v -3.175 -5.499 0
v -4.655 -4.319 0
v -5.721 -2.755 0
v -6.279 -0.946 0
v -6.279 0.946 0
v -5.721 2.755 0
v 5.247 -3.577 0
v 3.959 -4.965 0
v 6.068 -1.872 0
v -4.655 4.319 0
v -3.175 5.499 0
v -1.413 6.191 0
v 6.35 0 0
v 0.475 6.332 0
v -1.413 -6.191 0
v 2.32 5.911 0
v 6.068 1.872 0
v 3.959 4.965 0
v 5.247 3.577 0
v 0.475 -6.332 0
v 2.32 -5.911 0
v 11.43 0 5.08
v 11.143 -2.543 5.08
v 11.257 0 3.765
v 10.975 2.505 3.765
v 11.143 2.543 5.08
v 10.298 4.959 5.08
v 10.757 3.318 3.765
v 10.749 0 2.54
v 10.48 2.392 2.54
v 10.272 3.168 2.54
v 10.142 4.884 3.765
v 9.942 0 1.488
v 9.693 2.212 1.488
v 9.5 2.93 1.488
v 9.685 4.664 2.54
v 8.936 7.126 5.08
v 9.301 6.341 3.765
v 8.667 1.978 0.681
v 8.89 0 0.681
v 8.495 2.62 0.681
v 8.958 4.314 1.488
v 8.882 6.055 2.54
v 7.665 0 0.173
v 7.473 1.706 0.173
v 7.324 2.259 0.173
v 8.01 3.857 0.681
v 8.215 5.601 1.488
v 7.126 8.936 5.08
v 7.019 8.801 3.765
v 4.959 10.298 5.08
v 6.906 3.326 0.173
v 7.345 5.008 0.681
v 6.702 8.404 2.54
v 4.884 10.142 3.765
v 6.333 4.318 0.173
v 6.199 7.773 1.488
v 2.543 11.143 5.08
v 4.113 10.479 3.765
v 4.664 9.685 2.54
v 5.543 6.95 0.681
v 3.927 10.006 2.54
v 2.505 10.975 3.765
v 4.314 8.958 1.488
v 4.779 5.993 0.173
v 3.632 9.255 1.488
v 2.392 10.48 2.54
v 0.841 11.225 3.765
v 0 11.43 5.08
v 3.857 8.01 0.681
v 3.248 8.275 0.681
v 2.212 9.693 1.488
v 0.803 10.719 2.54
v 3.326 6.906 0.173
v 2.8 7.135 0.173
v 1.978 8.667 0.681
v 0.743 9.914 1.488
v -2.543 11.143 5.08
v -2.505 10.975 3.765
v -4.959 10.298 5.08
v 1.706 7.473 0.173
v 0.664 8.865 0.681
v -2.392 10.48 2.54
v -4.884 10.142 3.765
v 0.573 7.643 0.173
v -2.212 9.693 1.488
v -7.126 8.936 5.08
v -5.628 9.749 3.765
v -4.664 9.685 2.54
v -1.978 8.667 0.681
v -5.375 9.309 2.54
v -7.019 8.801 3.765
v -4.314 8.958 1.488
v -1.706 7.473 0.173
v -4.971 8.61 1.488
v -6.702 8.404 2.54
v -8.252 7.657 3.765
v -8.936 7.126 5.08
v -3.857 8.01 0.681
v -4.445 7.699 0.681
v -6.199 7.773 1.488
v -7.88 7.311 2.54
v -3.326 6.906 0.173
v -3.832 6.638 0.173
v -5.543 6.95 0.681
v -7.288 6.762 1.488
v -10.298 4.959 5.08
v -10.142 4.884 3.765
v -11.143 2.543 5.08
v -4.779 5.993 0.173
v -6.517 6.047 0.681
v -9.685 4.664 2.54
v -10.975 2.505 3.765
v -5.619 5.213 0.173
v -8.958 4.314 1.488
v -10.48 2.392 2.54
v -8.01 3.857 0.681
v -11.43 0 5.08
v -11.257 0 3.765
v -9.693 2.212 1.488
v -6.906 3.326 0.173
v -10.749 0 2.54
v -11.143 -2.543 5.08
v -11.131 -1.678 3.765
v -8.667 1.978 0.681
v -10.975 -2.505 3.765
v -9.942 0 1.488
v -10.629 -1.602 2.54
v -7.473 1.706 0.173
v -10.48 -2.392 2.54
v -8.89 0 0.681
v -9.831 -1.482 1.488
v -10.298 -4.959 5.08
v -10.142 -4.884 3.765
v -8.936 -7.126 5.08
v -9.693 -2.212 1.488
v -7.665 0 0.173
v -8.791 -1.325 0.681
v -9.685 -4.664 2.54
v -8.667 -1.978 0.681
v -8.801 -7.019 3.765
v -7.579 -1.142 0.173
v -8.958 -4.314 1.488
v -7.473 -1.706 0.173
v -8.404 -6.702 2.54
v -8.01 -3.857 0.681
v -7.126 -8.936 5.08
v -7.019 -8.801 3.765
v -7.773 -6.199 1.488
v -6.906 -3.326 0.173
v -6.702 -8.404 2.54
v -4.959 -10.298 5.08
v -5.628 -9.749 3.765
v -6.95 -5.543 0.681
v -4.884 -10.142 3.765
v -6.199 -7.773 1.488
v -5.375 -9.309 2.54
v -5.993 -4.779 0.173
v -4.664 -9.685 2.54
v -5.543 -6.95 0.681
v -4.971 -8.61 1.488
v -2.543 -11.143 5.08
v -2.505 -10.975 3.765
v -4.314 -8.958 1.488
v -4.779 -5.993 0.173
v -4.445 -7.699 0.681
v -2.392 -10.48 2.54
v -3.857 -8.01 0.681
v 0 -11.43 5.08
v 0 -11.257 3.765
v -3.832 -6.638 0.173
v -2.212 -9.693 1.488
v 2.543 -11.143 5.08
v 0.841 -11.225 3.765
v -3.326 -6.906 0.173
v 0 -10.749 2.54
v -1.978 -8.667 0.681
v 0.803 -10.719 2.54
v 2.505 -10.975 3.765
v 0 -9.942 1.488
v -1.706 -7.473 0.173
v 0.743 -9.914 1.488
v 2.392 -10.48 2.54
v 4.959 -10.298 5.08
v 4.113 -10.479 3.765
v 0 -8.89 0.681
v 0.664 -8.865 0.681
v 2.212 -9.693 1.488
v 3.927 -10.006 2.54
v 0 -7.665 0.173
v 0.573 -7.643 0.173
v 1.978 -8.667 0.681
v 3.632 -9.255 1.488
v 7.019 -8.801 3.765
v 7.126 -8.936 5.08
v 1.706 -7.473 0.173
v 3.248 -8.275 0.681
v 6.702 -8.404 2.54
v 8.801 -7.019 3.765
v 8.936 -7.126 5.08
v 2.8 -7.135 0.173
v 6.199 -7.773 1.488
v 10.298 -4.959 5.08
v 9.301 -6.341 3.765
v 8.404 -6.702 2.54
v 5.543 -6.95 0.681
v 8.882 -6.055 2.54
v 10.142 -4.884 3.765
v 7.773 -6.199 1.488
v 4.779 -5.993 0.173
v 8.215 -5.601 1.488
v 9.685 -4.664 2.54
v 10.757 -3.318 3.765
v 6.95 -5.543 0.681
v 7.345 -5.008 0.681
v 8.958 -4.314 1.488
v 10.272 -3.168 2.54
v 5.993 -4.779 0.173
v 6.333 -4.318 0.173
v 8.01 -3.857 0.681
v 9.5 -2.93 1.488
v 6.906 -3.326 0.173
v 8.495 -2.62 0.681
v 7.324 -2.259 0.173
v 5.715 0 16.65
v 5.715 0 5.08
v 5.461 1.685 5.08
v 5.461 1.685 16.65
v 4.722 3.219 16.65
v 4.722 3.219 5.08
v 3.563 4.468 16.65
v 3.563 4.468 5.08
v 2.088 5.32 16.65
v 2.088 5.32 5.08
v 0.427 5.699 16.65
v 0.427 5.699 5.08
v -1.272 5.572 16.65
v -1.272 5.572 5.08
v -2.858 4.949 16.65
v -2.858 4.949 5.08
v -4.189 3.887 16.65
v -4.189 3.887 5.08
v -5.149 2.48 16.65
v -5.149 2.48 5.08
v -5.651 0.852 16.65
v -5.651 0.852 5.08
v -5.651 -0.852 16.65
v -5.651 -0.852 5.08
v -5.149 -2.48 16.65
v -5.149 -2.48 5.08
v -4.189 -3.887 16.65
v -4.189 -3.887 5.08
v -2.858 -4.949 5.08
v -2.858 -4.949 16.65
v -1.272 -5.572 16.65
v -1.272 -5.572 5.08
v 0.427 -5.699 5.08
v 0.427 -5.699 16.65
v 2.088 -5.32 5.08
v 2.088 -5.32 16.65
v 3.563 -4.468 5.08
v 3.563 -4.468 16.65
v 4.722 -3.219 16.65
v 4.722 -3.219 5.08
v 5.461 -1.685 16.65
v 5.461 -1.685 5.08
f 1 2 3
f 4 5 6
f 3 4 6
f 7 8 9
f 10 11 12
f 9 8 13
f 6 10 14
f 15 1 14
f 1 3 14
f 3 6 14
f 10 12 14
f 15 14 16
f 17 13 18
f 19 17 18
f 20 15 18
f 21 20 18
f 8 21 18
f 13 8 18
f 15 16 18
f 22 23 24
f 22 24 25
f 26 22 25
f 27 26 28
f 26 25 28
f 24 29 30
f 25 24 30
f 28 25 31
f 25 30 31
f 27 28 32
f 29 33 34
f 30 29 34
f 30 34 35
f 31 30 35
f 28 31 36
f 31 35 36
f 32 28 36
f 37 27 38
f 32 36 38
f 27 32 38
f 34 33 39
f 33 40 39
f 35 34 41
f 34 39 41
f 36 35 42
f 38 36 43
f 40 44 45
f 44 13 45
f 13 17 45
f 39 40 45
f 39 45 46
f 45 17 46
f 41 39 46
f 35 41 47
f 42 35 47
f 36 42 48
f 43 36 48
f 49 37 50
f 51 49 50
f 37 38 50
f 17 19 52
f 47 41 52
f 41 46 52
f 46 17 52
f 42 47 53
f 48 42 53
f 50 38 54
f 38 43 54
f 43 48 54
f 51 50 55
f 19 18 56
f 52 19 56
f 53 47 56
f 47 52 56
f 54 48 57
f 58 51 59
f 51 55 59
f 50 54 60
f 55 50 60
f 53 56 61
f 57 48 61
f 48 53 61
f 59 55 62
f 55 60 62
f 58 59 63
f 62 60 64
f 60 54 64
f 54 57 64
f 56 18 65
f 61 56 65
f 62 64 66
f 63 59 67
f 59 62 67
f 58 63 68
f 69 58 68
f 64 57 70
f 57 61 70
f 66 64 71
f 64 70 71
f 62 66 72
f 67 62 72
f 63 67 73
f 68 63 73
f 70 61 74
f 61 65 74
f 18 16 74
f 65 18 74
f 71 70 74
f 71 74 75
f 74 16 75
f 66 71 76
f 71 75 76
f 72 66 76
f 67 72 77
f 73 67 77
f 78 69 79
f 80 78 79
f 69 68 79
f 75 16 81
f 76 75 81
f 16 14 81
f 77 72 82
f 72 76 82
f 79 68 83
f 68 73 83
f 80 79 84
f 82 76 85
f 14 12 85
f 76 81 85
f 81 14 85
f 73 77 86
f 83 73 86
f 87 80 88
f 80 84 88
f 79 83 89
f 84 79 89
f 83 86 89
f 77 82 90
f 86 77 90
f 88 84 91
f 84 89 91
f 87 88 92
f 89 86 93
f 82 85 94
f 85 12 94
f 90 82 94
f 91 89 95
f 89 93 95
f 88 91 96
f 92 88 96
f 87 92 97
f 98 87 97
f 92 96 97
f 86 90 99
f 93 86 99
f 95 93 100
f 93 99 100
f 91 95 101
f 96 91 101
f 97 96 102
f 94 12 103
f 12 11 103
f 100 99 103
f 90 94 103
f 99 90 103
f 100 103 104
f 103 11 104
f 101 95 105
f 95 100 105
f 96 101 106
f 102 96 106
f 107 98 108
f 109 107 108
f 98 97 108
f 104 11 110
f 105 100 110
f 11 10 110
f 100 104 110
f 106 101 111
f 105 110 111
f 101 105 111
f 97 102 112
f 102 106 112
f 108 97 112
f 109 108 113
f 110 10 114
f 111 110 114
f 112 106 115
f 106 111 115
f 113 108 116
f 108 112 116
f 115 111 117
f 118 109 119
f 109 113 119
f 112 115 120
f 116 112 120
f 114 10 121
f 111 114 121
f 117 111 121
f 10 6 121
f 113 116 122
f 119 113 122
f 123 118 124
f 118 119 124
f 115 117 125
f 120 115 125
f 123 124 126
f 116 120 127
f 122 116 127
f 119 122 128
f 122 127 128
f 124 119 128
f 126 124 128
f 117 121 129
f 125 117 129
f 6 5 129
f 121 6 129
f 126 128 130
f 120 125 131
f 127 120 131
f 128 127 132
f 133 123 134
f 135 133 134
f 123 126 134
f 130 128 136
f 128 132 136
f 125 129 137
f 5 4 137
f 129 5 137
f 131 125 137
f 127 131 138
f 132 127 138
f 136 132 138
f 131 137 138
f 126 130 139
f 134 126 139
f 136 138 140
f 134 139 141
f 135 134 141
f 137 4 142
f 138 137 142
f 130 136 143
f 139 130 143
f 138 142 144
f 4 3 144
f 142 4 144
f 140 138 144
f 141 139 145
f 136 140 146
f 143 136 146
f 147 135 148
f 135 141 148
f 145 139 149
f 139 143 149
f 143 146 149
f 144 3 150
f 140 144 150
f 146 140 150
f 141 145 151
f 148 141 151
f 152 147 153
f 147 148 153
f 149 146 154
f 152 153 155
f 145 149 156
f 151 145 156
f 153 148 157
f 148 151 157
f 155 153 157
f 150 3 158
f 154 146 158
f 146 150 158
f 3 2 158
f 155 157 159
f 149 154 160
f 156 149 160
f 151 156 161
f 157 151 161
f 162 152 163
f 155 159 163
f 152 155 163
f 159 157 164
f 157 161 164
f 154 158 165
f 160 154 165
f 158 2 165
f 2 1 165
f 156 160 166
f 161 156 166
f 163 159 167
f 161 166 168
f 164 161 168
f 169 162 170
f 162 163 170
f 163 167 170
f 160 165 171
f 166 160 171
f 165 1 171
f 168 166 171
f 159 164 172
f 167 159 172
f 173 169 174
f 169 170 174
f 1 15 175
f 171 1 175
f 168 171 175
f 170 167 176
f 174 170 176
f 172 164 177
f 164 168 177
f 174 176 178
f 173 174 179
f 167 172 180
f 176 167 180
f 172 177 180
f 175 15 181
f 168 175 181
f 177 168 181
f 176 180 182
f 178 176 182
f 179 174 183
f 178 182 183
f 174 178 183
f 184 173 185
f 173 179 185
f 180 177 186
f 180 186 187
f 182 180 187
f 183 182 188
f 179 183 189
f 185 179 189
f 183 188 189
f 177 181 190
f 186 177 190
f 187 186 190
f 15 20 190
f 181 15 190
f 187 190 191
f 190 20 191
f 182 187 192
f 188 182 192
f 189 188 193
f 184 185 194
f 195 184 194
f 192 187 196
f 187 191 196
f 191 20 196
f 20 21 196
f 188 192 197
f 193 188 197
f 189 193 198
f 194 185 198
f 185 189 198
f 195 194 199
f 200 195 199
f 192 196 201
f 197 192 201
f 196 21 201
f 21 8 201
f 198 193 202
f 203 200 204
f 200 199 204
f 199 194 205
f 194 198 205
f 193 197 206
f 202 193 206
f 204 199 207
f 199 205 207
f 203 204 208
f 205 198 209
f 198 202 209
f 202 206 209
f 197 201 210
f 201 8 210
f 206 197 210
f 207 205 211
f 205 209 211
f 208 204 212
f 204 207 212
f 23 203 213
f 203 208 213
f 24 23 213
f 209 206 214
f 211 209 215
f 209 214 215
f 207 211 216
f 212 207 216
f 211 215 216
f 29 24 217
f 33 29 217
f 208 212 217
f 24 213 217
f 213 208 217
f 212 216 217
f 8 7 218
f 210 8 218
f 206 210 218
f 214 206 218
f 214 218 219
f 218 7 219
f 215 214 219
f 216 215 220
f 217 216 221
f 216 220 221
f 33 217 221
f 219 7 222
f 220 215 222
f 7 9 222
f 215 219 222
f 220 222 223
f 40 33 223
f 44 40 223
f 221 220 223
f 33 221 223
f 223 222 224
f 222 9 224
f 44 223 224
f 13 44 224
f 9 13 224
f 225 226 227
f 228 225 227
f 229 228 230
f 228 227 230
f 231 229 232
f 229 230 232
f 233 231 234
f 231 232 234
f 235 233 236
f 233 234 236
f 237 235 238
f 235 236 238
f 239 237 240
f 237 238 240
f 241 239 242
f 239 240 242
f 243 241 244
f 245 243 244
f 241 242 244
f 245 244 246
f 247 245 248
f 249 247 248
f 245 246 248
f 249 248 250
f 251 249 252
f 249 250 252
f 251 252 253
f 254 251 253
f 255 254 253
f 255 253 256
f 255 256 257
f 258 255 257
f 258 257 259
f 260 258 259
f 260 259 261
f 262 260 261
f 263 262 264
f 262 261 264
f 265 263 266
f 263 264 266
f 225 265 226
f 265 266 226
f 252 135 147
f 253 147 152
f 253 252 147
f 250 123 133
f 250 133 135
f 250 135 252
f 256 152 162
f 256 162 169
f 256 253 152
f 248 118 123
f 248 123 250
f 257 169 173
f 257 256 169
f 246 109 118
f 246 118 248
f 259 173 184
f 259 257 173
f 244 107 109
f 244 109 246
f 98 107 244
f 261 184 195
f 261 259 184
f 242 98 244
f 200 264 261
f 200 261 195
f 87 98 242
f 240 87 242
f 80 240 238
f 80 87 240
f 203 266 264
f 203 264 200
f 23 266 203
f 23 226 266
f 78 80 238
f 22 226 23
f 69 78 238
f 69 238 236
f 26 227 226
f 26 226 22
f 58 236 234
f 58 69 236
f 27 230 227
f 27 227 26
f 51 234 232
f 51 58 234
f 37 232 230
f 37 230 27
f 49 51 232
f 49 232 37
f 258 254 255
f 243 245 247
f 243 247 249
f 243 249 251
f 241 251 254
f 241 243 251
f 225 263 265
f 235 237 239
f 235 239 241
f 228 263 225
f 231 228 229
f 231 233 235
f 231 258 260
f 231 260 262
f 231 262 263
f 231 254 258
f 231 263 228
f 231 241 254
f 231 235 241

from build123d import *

# Parameters (mm, degrees)
F0_R     = 11.43
F1_DEPTH = 5.08
F2_R     = 5.07999
F3_R     = 5.715
F4_DEPTH = 11.5697


# Not quite as in the source:
# - a fillet or chamfer is up to 0.001 mm smaller than in the source, because OpenCascade refuses the exact size


with BuildPart() as f1:
    # F0 (on Top) → F1 (new body)
    with BuildSketch(Plane.XY):
        Circle(F0_R)
    extrude(amount=F1_DEPTH)

    # F2 (radius 5.08 in the source; OpenCascade refuses exactly that, so slightly less here)
    f2_edges = [f1.edges().sort_by_distance(p)[0] for p in [
        (-11.43, 0, 0),
    ]]
    fillet(f2_edges, radius=F2_R)

    # F3 (on face) → F4 (join)
    with BuildSketch(Plane.XY.offset(5.08)):
        Circle(F3_R)
    extrude(amount=F4_DEPTH)


solid = f1.part
